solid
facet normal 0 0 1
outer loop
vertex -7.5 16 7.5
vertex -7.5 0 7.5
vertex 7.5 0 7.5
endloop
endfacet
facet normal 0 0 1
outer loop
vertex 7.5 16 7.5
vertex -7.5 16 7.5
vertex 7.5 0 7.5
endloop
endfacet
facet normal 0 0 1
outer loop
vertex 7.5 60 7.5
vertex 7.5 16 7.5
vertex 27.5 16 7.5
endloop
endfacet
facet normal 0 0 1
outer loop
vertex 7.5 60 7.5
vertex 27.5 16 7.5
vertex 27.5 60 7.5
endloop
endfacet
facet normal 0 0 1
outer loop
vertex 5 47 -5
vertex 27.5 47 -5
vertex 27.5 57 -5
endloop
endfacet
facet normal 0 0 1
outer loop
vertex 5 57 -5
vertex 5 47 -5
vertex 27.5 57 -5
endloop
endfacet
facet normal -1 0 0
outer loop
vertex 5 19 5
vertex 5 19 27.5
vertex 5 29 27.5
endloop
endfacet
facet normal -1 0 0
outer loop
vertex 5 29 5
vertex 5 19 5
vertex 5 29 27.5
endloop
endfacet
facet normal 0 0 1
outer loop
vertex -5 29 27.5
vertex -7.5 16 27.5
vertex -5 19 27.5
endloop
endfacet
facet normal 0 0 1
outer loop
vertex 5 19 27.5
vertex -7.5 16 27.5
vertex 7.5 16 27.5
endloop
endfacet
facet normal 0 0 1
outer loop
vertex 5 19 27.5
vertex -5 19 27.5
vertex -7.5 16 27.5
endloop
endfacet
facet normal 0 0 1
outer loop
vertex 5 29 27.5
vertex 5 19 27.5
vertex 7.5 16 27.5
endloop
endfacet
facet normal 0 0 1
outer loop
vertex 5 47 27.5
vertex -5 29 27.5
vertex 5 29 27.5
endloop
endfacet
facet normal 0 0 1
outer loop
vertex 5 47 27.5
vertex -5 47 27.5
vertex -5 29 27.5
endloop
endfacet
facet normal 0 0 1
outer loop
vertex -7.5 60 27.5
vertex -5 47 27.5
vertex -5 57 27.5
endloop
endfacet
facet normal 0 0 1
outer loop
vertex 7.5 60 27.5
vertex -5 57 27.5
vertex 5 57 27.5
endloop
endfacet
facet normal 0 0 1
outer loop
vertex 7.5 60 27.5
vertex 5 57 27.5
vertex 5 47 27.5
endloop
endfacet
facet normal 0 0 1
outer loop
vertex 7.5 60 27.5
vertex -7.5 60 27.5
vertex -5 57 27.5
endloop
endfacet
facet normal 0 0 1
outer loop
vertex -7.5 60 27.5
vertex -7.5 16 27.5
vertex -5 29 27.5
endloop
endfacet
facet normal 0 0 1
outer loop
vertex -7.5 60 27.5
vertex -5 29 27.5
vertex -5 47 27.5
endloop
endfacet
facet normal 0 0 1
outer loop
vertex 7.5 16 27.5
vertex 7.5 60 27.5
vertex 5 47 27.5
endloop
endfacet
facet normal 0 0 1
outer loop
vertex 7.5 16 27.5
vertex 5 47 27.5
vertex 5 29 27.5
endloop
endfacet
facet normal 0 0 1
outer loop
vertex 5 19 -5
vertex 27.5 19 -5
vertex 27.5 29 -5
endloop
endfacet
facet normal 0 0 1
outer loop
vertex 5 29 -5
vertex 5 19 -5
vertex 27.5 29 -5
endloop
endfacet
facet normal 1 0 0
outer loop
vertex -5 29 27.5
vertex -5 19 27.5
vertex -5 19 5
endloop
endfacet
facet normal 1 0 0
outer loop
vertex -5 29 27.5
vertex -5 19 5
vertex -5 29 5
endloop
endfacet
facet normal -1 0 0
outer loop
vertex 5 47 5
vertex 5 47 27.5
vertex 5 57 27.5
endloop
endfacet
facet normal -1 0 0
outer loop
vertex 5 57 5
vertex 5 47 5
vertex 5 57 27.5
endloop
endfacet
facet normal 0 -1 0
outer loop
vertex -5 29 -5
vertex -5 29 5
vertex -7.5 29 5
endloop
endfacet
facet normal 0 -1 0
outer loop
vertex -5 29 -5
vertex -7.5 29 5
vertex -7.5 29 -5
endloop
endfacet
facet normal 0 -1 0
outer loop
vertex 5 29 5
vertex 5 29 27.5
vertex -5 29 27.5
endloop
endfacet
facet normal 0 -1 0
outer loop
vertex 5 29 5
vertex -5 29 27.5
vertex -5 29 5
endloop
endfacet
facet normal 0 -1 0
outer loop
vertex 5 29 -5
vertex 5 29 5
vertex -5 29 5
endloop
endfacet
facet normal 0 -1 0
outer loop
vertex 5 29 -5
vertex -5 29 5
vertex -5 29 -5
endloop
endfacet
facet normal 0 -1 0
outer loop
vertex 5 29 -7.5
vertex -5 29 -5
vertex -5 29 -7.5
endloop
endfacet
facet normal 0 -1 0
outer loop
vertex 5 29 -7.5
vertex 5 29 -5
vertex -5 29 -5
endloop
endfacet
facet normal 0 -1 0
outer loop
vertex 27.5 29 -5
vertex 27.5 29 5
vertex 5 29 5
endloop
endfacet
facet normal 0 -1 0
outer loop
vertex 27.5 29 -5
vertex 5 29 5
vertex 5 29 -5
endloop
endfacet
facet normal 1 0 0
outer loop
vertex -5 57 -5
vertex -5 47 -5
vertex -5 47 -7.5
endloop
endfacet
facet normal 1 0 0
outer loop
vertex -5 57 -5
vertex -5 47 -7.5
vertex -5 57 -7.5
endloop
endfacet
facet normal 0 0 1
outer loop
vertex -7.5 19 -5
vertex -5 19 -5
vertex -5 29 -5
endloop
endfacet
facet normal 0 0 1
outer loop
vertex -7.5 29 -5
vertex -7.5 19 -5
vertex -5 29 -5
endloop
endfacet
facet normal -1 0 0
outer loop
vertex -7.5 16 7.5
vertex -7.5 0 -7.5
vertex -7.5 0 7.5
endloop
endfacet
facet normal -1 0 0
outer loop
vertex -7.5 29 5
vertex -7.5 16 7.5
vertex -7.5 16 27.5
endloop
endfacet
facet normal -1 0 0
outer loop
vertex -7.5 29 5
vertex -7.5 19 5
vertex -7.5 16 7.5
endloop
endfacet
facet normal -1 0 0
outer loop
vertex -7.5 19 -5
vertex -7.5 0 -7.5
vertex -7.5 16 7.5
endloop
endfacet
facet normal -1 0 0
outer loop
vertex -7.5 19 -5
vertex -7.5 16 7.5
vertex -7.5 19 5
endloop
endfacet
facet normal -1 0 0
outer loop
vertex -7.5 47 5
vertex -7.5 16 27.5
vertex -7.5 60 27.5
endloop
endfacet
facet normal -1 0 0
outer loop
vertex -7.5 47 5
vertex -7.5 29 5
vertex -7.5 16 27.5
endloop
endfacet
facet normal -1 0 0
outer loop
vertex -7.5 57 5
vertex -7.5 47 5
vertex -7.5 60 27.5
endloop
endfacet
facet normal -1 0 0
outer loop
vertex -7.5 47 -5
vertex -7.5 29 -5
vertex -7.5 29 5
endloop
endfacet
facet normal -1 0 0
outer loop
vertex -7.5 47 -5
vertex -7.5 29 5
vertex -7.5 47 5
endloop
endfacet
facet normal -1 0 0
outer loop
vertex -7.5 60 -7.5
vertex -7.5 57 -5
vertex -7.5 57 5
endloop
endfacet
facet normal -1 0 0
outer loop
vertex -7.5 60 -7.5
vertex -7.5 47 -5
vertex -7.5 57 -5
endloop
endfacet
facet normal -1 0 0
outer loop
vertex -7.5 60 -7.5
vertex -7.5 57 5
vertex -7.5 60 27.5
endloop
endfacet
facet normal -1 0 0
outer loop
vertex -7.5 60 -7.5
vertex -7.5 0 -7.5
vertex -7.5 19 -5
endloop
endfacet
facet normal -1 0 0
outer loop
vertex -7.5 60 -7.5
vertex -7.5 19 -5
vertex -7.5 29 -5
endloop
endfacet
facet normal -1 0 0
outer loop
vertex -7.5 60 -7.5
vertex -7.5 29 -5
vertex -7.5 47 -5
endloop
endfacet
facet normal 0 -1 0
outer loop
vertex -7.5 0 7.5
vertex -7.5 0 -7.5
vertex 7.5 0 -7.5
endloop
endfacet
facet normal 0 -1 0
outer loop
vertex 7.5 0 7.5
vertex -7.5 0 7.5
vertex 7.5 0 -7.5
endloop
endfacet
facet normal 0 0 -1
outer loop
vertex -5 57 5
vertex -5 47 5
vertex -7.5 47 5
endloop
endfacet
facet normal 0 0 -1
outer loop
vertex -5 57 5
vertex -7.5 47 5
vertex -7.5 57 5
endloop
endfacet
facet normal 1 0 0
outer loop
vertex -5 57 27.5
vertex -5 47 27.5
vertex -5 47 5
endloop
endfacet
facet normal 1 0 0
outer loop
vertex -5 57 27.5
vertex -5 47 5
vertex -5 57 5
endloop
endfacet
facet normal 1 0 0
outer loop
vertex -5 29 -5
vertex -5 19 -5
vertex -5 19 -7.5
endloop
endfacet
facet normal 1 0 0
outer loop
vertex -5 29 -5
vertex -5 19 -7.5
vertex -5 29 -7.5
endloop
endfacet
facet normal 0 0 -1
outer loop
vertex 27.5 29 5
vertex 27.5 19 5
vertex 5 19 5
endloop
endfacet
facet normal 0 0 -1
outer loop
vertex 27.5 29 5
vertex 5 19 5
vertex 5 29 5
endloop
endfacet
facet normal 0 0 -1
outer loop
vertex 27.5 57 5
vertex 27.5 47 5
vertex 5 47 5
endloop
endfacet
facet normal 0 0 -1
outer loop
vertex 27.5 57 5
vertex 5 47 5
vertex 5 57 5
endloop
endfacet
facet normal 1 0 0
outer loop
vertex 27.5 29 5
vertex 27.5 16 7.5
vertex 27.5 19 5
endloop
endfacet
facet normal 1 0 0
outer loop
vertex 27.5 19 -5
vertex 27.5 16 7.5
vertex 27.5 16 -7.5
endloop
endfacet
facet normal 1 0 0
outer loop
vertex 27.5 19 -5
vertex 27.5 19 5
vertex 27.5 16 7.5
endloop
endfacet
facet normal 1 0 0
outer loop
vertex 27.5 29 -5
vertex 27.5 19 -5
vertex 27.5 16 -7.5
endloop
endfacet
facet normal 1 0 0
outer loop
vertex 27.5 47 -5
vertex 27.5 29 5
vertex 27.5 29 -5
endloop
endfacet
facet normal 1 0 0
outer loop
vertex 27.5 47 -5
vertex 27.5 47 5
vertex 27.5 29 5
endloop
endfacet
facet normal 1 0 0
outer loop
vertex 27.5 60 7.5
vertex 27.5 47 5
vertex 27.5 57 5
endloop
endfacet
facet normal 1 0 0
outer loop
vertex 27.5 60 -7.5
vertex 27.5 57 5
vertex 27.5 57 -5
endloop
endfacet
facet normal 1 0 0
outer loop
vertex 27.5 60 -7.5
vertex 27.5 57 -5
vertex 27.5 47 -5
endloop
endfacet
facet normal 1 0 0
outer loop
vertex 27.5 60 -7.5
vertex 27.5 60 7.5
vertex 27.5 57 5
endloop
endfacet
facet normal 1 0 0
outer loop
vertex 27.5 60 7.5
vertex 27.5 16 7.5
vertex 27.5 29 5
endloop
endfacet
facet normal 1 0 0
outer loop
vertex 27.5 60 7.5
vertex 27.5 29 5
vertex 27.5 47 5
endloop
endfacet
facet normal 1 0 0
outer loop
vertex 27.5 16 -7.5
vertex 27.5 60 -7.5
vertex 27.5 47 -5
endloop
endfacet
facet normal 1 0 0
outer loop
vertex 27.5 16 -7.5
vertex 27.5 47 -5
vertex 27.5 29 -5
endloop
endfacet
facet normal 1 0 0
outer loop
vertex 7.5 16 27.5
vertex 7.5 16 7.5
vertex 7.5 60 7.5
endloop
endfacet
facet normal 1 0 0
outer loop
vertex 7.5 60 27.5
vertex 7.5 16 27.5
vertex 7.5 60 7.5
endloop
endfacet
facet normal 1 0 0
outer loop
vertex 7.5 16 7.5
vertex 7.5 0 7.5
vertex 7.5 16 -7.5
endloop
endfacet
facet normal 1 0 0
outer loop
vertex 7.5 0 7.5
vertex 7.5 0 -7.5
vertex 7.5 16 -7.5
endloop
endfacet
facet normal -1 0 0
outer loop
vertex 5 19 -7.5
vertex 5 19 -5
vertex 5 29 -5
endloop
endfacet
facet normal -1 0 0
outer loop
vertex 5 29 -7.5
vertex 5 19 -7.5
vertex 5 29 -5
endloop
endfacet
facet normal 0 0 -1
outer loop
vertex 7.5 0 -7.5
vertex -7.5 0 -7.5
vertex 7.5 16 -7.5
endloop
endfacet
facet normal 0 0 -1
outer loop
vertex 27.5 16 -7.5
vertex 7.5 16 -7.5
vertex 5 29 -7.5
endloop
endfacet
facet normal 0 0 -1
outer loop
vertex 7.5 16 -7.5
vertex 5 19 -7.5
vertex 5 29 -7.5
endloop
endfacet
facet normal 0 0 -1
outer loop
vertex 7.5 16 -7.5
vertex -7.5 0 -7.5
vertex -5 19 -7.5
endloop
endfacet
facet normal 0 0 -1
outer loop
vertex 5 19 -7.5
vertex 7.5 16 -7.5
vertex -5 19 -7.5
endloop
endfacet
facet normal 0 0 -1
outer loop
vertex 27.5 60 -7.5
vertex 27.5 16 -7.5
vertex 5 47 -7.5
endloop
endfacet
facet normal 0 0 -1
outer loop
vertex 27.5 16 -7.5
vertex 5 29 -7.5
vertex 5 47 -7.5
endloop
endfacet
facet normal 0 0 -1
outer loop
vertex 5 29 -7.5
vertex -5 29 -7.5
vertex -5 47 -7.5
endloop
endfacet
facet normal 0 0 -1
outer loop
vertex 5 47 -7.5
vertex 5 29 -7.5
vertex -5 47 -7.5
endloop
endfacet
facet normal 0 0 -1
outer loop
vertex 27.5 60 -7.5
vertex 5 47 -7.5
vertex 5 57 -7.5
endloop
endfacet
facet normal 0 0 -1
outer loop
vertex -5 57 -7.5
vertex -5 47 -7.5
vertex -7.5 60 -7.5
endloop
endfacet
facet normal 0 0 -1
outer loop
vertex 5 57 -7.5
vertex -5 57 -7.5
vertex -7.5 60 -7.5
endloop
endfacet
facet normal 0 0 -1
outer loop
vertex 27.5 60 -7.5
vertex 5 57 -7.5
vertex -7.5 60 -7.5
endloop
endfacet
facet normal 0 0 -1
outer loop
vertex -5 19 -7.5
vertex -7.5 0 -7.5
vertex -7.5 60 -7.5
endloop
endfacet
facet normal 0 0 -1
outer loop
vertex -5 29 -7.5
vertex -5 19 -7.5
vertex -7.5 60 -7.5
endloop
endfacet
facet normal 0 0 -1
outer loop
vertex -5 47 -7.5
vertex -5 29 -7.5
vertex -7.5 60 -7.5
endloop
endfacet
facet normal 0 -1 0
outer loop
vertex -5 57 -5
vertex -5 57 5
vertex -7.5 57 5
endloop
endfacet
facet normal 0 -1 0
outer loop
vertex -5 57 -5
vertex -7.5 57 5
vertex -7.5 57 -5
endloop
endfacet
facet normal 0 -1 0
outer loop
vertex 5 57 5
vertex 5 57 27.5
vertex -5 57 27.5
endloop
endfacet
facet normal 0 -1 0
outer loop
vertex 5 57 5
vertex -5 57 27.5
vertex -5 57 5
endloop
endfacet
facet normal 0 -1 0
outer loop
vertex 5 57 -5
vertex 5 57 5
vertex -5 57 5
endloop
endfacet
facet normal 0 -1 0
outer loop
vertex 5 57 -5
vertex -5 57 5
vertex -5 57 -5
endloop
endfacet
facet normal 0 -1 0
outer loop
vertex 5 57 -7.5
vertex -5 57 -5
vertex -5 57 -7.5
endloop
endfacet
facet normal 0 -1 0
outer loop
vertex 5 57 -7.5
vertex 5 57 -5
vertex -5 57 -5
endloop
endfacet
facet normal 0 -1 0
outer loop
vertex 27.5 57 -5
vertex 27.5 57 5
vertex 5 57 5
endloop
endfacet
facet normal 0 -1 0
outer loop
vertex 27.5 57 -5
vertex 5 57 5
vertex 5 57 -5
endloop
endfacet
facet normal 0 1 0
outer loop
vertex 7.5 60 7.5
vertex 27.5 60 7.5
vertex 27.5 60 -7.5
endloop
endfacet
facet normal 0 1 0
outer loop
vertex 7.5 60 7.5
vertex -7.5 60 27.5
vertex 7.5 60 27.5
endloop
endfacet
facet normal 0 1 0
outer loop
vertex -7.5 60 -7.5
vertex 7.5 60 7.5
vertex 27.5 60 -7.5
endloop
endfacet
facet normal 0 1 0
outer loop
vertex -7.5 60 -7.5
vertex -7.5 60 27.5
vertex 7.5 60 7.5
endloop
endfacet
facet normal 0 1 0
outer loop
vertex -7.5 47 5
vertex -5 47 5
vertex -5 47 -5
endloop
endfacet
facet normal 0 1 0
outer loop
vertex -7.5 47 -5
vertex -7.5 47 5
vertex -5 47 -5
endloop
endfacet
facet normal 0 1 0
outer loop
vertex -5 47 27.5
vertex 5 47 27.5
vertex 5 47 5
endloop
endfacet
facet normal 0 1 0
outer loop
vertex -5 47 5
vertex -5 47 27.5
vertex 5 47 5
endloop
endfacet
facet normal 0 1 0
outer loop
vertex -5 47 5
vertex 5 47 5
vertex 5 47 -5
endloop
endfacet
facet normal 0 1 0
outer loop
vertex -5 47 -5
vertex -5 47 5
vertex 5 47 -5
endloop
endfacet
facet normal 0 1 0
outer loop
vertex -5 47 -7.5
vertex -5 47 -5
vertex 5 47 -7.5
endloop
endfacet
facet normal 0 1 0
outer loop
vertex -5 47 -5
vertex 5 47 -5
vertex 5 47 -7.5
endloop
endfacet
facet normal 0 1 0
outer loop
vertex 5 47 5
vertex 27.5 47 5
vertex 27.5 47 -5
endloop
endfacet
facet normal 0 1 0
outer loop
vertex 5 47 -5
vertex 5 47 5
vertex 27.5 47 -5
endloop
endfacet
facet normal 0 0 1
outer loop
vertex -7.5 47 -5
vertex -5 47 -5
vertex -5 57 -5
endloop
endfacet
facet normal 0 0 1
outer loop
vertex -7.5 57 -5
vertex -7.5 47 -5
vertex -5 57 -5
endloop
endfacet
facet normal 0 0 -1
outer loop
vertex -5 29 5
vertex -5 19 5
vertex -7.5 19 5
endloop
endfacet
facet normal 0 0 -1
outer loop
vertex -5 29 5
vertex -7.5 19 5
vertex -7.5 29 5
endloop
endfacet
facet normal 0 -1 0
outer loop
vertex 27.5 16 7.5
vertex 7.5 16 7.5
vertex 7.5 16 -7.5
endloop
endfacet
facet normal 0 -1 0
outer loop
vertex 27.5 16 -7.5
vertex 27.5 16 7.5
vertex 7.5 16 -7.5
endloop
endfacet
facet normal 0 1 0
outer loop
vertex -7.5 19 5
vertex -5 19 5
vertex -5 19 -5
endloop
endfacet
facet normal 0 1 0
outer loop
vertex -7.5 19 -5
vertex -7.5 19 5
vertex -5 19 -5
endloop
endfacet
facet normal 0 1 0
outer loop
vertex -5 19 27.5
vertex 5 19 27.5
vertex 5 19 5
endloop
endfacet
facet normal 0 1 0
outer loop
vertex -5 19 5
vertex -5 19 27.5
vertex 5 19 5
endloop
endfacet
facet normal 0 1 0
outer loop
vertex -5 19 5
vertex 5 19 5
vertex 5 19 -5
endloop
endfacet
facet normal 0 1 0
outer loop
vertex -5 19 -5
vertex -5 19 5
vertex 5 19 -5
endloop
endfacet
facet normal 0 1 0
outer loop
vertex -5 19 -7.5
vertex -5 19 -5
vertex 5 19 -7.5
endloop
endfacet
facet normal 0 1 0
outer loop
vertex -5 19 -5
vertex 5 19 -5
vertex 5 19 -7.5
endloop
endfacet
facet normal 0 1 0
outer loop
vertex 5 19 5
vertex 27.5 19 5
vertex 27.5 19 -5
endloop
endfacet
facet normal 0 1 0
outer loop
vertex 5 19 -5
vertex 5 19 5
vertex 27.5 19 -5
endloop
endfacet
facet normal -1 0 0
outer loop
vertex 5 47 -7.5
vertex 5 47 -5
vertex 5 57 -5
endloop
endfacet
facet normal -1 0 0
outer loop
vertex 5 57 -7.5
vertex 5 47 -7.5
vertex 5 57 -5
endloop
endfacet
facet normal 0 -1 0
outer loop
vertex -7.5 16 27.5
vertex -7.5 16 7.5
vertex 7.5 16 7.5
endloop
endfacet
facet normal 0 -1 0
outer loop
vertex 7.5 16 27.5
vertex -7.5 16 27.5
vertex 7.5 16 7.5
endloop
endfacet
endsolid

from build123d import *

# Parameters (mm, degrees)
SKETCH_1_W          = 15
SKETCH_1_H          = 15
EXTRUDE_1_DEPTH     = 60
SKETCH_4_W          = 15
SKETCH_4_H          = 44
EXTRUDE_4_DEPTH     = 20
SKETCH_5_W          = 15
SKETCH_5_H          = 44
EXTRUDE_5_DEPTH     = 20
SKETCH_6_W          = 10
SKETCH_6_H          = 10
CUT_EXTRUDE_1_DEPTH = 70
SKETCH_7_W          = 10
SKETCH_7_H          = 10
CUT_EXTRUDE_2_DEPTH = 70


with BuildPart() as part:
    # 草图1 → 凸台-拉伸1 (new body)
    with BuildSketch(Plane(origin=(0, 0, 0), x_dir=(1, 0, 0), z_dir=(0, 1, 0))):
        Rectangle(SKETCH_1_W, SKETCH_1_H)
    extrude(amount=EXTRUDE_1_DEPTH)

    # 草图4 → 凸台-拉伸4 (add)
    with BuildSketch(Plane.XY.offset(7.5)):
        with Locations((0, 38)):
            Rectangle(SKETCH_4_W, SKETCH_4_H)
    extrude(amount=EXTRUDE_4_DEPTH)

    # 草图5 → 凸台-拉伸5 (add)
    with BuildSketch(Plane(origin=(7.5, 0, 0), x_dir=(0, 0, -1), z_dir=(1, 0, 0))):
        with Locations((0, 38)):
            Rectangle(SKETCH_5_W, SKETCH_5_H)
    extrude(amount=EXTRUDE_5_DEPTH)

    # 草图6 → 切除-拉伸1 (cut)
    with BuildSketch(Plane.XY.offset(27.5)):
        with Locations((0, 52)):
            Rectangle(SKETCH_6_W, SKETCH_6_H)
        with Locations((0, 24)):
            Rectangle(SKETCH_6_W, SKETCH_6_H)
    extrude(amount=-CUT_EXTRUDE_1_DEPTH, mode=Mode.SUBTRACT)

    # 草图7 → 切除-拉伸2 (cut)
    with BuildSketch(Plane(origin=(27.5, 0, 0), x_dir=(0, 0, -1), z_dir=(1, 0, 0))):
        with Locations((0, 52)):
            Rectangle(SKETCH_7_W, SKETCH_7_H)
        with Locations((0, 24)):
            Rectangle(SKETCH_7_W, SKETCH_7_H)
    extrude(amount=-CUT_EXTRUDE_2_DEPTH, mode=Mode.SUBTRACT)


solid = part.part
